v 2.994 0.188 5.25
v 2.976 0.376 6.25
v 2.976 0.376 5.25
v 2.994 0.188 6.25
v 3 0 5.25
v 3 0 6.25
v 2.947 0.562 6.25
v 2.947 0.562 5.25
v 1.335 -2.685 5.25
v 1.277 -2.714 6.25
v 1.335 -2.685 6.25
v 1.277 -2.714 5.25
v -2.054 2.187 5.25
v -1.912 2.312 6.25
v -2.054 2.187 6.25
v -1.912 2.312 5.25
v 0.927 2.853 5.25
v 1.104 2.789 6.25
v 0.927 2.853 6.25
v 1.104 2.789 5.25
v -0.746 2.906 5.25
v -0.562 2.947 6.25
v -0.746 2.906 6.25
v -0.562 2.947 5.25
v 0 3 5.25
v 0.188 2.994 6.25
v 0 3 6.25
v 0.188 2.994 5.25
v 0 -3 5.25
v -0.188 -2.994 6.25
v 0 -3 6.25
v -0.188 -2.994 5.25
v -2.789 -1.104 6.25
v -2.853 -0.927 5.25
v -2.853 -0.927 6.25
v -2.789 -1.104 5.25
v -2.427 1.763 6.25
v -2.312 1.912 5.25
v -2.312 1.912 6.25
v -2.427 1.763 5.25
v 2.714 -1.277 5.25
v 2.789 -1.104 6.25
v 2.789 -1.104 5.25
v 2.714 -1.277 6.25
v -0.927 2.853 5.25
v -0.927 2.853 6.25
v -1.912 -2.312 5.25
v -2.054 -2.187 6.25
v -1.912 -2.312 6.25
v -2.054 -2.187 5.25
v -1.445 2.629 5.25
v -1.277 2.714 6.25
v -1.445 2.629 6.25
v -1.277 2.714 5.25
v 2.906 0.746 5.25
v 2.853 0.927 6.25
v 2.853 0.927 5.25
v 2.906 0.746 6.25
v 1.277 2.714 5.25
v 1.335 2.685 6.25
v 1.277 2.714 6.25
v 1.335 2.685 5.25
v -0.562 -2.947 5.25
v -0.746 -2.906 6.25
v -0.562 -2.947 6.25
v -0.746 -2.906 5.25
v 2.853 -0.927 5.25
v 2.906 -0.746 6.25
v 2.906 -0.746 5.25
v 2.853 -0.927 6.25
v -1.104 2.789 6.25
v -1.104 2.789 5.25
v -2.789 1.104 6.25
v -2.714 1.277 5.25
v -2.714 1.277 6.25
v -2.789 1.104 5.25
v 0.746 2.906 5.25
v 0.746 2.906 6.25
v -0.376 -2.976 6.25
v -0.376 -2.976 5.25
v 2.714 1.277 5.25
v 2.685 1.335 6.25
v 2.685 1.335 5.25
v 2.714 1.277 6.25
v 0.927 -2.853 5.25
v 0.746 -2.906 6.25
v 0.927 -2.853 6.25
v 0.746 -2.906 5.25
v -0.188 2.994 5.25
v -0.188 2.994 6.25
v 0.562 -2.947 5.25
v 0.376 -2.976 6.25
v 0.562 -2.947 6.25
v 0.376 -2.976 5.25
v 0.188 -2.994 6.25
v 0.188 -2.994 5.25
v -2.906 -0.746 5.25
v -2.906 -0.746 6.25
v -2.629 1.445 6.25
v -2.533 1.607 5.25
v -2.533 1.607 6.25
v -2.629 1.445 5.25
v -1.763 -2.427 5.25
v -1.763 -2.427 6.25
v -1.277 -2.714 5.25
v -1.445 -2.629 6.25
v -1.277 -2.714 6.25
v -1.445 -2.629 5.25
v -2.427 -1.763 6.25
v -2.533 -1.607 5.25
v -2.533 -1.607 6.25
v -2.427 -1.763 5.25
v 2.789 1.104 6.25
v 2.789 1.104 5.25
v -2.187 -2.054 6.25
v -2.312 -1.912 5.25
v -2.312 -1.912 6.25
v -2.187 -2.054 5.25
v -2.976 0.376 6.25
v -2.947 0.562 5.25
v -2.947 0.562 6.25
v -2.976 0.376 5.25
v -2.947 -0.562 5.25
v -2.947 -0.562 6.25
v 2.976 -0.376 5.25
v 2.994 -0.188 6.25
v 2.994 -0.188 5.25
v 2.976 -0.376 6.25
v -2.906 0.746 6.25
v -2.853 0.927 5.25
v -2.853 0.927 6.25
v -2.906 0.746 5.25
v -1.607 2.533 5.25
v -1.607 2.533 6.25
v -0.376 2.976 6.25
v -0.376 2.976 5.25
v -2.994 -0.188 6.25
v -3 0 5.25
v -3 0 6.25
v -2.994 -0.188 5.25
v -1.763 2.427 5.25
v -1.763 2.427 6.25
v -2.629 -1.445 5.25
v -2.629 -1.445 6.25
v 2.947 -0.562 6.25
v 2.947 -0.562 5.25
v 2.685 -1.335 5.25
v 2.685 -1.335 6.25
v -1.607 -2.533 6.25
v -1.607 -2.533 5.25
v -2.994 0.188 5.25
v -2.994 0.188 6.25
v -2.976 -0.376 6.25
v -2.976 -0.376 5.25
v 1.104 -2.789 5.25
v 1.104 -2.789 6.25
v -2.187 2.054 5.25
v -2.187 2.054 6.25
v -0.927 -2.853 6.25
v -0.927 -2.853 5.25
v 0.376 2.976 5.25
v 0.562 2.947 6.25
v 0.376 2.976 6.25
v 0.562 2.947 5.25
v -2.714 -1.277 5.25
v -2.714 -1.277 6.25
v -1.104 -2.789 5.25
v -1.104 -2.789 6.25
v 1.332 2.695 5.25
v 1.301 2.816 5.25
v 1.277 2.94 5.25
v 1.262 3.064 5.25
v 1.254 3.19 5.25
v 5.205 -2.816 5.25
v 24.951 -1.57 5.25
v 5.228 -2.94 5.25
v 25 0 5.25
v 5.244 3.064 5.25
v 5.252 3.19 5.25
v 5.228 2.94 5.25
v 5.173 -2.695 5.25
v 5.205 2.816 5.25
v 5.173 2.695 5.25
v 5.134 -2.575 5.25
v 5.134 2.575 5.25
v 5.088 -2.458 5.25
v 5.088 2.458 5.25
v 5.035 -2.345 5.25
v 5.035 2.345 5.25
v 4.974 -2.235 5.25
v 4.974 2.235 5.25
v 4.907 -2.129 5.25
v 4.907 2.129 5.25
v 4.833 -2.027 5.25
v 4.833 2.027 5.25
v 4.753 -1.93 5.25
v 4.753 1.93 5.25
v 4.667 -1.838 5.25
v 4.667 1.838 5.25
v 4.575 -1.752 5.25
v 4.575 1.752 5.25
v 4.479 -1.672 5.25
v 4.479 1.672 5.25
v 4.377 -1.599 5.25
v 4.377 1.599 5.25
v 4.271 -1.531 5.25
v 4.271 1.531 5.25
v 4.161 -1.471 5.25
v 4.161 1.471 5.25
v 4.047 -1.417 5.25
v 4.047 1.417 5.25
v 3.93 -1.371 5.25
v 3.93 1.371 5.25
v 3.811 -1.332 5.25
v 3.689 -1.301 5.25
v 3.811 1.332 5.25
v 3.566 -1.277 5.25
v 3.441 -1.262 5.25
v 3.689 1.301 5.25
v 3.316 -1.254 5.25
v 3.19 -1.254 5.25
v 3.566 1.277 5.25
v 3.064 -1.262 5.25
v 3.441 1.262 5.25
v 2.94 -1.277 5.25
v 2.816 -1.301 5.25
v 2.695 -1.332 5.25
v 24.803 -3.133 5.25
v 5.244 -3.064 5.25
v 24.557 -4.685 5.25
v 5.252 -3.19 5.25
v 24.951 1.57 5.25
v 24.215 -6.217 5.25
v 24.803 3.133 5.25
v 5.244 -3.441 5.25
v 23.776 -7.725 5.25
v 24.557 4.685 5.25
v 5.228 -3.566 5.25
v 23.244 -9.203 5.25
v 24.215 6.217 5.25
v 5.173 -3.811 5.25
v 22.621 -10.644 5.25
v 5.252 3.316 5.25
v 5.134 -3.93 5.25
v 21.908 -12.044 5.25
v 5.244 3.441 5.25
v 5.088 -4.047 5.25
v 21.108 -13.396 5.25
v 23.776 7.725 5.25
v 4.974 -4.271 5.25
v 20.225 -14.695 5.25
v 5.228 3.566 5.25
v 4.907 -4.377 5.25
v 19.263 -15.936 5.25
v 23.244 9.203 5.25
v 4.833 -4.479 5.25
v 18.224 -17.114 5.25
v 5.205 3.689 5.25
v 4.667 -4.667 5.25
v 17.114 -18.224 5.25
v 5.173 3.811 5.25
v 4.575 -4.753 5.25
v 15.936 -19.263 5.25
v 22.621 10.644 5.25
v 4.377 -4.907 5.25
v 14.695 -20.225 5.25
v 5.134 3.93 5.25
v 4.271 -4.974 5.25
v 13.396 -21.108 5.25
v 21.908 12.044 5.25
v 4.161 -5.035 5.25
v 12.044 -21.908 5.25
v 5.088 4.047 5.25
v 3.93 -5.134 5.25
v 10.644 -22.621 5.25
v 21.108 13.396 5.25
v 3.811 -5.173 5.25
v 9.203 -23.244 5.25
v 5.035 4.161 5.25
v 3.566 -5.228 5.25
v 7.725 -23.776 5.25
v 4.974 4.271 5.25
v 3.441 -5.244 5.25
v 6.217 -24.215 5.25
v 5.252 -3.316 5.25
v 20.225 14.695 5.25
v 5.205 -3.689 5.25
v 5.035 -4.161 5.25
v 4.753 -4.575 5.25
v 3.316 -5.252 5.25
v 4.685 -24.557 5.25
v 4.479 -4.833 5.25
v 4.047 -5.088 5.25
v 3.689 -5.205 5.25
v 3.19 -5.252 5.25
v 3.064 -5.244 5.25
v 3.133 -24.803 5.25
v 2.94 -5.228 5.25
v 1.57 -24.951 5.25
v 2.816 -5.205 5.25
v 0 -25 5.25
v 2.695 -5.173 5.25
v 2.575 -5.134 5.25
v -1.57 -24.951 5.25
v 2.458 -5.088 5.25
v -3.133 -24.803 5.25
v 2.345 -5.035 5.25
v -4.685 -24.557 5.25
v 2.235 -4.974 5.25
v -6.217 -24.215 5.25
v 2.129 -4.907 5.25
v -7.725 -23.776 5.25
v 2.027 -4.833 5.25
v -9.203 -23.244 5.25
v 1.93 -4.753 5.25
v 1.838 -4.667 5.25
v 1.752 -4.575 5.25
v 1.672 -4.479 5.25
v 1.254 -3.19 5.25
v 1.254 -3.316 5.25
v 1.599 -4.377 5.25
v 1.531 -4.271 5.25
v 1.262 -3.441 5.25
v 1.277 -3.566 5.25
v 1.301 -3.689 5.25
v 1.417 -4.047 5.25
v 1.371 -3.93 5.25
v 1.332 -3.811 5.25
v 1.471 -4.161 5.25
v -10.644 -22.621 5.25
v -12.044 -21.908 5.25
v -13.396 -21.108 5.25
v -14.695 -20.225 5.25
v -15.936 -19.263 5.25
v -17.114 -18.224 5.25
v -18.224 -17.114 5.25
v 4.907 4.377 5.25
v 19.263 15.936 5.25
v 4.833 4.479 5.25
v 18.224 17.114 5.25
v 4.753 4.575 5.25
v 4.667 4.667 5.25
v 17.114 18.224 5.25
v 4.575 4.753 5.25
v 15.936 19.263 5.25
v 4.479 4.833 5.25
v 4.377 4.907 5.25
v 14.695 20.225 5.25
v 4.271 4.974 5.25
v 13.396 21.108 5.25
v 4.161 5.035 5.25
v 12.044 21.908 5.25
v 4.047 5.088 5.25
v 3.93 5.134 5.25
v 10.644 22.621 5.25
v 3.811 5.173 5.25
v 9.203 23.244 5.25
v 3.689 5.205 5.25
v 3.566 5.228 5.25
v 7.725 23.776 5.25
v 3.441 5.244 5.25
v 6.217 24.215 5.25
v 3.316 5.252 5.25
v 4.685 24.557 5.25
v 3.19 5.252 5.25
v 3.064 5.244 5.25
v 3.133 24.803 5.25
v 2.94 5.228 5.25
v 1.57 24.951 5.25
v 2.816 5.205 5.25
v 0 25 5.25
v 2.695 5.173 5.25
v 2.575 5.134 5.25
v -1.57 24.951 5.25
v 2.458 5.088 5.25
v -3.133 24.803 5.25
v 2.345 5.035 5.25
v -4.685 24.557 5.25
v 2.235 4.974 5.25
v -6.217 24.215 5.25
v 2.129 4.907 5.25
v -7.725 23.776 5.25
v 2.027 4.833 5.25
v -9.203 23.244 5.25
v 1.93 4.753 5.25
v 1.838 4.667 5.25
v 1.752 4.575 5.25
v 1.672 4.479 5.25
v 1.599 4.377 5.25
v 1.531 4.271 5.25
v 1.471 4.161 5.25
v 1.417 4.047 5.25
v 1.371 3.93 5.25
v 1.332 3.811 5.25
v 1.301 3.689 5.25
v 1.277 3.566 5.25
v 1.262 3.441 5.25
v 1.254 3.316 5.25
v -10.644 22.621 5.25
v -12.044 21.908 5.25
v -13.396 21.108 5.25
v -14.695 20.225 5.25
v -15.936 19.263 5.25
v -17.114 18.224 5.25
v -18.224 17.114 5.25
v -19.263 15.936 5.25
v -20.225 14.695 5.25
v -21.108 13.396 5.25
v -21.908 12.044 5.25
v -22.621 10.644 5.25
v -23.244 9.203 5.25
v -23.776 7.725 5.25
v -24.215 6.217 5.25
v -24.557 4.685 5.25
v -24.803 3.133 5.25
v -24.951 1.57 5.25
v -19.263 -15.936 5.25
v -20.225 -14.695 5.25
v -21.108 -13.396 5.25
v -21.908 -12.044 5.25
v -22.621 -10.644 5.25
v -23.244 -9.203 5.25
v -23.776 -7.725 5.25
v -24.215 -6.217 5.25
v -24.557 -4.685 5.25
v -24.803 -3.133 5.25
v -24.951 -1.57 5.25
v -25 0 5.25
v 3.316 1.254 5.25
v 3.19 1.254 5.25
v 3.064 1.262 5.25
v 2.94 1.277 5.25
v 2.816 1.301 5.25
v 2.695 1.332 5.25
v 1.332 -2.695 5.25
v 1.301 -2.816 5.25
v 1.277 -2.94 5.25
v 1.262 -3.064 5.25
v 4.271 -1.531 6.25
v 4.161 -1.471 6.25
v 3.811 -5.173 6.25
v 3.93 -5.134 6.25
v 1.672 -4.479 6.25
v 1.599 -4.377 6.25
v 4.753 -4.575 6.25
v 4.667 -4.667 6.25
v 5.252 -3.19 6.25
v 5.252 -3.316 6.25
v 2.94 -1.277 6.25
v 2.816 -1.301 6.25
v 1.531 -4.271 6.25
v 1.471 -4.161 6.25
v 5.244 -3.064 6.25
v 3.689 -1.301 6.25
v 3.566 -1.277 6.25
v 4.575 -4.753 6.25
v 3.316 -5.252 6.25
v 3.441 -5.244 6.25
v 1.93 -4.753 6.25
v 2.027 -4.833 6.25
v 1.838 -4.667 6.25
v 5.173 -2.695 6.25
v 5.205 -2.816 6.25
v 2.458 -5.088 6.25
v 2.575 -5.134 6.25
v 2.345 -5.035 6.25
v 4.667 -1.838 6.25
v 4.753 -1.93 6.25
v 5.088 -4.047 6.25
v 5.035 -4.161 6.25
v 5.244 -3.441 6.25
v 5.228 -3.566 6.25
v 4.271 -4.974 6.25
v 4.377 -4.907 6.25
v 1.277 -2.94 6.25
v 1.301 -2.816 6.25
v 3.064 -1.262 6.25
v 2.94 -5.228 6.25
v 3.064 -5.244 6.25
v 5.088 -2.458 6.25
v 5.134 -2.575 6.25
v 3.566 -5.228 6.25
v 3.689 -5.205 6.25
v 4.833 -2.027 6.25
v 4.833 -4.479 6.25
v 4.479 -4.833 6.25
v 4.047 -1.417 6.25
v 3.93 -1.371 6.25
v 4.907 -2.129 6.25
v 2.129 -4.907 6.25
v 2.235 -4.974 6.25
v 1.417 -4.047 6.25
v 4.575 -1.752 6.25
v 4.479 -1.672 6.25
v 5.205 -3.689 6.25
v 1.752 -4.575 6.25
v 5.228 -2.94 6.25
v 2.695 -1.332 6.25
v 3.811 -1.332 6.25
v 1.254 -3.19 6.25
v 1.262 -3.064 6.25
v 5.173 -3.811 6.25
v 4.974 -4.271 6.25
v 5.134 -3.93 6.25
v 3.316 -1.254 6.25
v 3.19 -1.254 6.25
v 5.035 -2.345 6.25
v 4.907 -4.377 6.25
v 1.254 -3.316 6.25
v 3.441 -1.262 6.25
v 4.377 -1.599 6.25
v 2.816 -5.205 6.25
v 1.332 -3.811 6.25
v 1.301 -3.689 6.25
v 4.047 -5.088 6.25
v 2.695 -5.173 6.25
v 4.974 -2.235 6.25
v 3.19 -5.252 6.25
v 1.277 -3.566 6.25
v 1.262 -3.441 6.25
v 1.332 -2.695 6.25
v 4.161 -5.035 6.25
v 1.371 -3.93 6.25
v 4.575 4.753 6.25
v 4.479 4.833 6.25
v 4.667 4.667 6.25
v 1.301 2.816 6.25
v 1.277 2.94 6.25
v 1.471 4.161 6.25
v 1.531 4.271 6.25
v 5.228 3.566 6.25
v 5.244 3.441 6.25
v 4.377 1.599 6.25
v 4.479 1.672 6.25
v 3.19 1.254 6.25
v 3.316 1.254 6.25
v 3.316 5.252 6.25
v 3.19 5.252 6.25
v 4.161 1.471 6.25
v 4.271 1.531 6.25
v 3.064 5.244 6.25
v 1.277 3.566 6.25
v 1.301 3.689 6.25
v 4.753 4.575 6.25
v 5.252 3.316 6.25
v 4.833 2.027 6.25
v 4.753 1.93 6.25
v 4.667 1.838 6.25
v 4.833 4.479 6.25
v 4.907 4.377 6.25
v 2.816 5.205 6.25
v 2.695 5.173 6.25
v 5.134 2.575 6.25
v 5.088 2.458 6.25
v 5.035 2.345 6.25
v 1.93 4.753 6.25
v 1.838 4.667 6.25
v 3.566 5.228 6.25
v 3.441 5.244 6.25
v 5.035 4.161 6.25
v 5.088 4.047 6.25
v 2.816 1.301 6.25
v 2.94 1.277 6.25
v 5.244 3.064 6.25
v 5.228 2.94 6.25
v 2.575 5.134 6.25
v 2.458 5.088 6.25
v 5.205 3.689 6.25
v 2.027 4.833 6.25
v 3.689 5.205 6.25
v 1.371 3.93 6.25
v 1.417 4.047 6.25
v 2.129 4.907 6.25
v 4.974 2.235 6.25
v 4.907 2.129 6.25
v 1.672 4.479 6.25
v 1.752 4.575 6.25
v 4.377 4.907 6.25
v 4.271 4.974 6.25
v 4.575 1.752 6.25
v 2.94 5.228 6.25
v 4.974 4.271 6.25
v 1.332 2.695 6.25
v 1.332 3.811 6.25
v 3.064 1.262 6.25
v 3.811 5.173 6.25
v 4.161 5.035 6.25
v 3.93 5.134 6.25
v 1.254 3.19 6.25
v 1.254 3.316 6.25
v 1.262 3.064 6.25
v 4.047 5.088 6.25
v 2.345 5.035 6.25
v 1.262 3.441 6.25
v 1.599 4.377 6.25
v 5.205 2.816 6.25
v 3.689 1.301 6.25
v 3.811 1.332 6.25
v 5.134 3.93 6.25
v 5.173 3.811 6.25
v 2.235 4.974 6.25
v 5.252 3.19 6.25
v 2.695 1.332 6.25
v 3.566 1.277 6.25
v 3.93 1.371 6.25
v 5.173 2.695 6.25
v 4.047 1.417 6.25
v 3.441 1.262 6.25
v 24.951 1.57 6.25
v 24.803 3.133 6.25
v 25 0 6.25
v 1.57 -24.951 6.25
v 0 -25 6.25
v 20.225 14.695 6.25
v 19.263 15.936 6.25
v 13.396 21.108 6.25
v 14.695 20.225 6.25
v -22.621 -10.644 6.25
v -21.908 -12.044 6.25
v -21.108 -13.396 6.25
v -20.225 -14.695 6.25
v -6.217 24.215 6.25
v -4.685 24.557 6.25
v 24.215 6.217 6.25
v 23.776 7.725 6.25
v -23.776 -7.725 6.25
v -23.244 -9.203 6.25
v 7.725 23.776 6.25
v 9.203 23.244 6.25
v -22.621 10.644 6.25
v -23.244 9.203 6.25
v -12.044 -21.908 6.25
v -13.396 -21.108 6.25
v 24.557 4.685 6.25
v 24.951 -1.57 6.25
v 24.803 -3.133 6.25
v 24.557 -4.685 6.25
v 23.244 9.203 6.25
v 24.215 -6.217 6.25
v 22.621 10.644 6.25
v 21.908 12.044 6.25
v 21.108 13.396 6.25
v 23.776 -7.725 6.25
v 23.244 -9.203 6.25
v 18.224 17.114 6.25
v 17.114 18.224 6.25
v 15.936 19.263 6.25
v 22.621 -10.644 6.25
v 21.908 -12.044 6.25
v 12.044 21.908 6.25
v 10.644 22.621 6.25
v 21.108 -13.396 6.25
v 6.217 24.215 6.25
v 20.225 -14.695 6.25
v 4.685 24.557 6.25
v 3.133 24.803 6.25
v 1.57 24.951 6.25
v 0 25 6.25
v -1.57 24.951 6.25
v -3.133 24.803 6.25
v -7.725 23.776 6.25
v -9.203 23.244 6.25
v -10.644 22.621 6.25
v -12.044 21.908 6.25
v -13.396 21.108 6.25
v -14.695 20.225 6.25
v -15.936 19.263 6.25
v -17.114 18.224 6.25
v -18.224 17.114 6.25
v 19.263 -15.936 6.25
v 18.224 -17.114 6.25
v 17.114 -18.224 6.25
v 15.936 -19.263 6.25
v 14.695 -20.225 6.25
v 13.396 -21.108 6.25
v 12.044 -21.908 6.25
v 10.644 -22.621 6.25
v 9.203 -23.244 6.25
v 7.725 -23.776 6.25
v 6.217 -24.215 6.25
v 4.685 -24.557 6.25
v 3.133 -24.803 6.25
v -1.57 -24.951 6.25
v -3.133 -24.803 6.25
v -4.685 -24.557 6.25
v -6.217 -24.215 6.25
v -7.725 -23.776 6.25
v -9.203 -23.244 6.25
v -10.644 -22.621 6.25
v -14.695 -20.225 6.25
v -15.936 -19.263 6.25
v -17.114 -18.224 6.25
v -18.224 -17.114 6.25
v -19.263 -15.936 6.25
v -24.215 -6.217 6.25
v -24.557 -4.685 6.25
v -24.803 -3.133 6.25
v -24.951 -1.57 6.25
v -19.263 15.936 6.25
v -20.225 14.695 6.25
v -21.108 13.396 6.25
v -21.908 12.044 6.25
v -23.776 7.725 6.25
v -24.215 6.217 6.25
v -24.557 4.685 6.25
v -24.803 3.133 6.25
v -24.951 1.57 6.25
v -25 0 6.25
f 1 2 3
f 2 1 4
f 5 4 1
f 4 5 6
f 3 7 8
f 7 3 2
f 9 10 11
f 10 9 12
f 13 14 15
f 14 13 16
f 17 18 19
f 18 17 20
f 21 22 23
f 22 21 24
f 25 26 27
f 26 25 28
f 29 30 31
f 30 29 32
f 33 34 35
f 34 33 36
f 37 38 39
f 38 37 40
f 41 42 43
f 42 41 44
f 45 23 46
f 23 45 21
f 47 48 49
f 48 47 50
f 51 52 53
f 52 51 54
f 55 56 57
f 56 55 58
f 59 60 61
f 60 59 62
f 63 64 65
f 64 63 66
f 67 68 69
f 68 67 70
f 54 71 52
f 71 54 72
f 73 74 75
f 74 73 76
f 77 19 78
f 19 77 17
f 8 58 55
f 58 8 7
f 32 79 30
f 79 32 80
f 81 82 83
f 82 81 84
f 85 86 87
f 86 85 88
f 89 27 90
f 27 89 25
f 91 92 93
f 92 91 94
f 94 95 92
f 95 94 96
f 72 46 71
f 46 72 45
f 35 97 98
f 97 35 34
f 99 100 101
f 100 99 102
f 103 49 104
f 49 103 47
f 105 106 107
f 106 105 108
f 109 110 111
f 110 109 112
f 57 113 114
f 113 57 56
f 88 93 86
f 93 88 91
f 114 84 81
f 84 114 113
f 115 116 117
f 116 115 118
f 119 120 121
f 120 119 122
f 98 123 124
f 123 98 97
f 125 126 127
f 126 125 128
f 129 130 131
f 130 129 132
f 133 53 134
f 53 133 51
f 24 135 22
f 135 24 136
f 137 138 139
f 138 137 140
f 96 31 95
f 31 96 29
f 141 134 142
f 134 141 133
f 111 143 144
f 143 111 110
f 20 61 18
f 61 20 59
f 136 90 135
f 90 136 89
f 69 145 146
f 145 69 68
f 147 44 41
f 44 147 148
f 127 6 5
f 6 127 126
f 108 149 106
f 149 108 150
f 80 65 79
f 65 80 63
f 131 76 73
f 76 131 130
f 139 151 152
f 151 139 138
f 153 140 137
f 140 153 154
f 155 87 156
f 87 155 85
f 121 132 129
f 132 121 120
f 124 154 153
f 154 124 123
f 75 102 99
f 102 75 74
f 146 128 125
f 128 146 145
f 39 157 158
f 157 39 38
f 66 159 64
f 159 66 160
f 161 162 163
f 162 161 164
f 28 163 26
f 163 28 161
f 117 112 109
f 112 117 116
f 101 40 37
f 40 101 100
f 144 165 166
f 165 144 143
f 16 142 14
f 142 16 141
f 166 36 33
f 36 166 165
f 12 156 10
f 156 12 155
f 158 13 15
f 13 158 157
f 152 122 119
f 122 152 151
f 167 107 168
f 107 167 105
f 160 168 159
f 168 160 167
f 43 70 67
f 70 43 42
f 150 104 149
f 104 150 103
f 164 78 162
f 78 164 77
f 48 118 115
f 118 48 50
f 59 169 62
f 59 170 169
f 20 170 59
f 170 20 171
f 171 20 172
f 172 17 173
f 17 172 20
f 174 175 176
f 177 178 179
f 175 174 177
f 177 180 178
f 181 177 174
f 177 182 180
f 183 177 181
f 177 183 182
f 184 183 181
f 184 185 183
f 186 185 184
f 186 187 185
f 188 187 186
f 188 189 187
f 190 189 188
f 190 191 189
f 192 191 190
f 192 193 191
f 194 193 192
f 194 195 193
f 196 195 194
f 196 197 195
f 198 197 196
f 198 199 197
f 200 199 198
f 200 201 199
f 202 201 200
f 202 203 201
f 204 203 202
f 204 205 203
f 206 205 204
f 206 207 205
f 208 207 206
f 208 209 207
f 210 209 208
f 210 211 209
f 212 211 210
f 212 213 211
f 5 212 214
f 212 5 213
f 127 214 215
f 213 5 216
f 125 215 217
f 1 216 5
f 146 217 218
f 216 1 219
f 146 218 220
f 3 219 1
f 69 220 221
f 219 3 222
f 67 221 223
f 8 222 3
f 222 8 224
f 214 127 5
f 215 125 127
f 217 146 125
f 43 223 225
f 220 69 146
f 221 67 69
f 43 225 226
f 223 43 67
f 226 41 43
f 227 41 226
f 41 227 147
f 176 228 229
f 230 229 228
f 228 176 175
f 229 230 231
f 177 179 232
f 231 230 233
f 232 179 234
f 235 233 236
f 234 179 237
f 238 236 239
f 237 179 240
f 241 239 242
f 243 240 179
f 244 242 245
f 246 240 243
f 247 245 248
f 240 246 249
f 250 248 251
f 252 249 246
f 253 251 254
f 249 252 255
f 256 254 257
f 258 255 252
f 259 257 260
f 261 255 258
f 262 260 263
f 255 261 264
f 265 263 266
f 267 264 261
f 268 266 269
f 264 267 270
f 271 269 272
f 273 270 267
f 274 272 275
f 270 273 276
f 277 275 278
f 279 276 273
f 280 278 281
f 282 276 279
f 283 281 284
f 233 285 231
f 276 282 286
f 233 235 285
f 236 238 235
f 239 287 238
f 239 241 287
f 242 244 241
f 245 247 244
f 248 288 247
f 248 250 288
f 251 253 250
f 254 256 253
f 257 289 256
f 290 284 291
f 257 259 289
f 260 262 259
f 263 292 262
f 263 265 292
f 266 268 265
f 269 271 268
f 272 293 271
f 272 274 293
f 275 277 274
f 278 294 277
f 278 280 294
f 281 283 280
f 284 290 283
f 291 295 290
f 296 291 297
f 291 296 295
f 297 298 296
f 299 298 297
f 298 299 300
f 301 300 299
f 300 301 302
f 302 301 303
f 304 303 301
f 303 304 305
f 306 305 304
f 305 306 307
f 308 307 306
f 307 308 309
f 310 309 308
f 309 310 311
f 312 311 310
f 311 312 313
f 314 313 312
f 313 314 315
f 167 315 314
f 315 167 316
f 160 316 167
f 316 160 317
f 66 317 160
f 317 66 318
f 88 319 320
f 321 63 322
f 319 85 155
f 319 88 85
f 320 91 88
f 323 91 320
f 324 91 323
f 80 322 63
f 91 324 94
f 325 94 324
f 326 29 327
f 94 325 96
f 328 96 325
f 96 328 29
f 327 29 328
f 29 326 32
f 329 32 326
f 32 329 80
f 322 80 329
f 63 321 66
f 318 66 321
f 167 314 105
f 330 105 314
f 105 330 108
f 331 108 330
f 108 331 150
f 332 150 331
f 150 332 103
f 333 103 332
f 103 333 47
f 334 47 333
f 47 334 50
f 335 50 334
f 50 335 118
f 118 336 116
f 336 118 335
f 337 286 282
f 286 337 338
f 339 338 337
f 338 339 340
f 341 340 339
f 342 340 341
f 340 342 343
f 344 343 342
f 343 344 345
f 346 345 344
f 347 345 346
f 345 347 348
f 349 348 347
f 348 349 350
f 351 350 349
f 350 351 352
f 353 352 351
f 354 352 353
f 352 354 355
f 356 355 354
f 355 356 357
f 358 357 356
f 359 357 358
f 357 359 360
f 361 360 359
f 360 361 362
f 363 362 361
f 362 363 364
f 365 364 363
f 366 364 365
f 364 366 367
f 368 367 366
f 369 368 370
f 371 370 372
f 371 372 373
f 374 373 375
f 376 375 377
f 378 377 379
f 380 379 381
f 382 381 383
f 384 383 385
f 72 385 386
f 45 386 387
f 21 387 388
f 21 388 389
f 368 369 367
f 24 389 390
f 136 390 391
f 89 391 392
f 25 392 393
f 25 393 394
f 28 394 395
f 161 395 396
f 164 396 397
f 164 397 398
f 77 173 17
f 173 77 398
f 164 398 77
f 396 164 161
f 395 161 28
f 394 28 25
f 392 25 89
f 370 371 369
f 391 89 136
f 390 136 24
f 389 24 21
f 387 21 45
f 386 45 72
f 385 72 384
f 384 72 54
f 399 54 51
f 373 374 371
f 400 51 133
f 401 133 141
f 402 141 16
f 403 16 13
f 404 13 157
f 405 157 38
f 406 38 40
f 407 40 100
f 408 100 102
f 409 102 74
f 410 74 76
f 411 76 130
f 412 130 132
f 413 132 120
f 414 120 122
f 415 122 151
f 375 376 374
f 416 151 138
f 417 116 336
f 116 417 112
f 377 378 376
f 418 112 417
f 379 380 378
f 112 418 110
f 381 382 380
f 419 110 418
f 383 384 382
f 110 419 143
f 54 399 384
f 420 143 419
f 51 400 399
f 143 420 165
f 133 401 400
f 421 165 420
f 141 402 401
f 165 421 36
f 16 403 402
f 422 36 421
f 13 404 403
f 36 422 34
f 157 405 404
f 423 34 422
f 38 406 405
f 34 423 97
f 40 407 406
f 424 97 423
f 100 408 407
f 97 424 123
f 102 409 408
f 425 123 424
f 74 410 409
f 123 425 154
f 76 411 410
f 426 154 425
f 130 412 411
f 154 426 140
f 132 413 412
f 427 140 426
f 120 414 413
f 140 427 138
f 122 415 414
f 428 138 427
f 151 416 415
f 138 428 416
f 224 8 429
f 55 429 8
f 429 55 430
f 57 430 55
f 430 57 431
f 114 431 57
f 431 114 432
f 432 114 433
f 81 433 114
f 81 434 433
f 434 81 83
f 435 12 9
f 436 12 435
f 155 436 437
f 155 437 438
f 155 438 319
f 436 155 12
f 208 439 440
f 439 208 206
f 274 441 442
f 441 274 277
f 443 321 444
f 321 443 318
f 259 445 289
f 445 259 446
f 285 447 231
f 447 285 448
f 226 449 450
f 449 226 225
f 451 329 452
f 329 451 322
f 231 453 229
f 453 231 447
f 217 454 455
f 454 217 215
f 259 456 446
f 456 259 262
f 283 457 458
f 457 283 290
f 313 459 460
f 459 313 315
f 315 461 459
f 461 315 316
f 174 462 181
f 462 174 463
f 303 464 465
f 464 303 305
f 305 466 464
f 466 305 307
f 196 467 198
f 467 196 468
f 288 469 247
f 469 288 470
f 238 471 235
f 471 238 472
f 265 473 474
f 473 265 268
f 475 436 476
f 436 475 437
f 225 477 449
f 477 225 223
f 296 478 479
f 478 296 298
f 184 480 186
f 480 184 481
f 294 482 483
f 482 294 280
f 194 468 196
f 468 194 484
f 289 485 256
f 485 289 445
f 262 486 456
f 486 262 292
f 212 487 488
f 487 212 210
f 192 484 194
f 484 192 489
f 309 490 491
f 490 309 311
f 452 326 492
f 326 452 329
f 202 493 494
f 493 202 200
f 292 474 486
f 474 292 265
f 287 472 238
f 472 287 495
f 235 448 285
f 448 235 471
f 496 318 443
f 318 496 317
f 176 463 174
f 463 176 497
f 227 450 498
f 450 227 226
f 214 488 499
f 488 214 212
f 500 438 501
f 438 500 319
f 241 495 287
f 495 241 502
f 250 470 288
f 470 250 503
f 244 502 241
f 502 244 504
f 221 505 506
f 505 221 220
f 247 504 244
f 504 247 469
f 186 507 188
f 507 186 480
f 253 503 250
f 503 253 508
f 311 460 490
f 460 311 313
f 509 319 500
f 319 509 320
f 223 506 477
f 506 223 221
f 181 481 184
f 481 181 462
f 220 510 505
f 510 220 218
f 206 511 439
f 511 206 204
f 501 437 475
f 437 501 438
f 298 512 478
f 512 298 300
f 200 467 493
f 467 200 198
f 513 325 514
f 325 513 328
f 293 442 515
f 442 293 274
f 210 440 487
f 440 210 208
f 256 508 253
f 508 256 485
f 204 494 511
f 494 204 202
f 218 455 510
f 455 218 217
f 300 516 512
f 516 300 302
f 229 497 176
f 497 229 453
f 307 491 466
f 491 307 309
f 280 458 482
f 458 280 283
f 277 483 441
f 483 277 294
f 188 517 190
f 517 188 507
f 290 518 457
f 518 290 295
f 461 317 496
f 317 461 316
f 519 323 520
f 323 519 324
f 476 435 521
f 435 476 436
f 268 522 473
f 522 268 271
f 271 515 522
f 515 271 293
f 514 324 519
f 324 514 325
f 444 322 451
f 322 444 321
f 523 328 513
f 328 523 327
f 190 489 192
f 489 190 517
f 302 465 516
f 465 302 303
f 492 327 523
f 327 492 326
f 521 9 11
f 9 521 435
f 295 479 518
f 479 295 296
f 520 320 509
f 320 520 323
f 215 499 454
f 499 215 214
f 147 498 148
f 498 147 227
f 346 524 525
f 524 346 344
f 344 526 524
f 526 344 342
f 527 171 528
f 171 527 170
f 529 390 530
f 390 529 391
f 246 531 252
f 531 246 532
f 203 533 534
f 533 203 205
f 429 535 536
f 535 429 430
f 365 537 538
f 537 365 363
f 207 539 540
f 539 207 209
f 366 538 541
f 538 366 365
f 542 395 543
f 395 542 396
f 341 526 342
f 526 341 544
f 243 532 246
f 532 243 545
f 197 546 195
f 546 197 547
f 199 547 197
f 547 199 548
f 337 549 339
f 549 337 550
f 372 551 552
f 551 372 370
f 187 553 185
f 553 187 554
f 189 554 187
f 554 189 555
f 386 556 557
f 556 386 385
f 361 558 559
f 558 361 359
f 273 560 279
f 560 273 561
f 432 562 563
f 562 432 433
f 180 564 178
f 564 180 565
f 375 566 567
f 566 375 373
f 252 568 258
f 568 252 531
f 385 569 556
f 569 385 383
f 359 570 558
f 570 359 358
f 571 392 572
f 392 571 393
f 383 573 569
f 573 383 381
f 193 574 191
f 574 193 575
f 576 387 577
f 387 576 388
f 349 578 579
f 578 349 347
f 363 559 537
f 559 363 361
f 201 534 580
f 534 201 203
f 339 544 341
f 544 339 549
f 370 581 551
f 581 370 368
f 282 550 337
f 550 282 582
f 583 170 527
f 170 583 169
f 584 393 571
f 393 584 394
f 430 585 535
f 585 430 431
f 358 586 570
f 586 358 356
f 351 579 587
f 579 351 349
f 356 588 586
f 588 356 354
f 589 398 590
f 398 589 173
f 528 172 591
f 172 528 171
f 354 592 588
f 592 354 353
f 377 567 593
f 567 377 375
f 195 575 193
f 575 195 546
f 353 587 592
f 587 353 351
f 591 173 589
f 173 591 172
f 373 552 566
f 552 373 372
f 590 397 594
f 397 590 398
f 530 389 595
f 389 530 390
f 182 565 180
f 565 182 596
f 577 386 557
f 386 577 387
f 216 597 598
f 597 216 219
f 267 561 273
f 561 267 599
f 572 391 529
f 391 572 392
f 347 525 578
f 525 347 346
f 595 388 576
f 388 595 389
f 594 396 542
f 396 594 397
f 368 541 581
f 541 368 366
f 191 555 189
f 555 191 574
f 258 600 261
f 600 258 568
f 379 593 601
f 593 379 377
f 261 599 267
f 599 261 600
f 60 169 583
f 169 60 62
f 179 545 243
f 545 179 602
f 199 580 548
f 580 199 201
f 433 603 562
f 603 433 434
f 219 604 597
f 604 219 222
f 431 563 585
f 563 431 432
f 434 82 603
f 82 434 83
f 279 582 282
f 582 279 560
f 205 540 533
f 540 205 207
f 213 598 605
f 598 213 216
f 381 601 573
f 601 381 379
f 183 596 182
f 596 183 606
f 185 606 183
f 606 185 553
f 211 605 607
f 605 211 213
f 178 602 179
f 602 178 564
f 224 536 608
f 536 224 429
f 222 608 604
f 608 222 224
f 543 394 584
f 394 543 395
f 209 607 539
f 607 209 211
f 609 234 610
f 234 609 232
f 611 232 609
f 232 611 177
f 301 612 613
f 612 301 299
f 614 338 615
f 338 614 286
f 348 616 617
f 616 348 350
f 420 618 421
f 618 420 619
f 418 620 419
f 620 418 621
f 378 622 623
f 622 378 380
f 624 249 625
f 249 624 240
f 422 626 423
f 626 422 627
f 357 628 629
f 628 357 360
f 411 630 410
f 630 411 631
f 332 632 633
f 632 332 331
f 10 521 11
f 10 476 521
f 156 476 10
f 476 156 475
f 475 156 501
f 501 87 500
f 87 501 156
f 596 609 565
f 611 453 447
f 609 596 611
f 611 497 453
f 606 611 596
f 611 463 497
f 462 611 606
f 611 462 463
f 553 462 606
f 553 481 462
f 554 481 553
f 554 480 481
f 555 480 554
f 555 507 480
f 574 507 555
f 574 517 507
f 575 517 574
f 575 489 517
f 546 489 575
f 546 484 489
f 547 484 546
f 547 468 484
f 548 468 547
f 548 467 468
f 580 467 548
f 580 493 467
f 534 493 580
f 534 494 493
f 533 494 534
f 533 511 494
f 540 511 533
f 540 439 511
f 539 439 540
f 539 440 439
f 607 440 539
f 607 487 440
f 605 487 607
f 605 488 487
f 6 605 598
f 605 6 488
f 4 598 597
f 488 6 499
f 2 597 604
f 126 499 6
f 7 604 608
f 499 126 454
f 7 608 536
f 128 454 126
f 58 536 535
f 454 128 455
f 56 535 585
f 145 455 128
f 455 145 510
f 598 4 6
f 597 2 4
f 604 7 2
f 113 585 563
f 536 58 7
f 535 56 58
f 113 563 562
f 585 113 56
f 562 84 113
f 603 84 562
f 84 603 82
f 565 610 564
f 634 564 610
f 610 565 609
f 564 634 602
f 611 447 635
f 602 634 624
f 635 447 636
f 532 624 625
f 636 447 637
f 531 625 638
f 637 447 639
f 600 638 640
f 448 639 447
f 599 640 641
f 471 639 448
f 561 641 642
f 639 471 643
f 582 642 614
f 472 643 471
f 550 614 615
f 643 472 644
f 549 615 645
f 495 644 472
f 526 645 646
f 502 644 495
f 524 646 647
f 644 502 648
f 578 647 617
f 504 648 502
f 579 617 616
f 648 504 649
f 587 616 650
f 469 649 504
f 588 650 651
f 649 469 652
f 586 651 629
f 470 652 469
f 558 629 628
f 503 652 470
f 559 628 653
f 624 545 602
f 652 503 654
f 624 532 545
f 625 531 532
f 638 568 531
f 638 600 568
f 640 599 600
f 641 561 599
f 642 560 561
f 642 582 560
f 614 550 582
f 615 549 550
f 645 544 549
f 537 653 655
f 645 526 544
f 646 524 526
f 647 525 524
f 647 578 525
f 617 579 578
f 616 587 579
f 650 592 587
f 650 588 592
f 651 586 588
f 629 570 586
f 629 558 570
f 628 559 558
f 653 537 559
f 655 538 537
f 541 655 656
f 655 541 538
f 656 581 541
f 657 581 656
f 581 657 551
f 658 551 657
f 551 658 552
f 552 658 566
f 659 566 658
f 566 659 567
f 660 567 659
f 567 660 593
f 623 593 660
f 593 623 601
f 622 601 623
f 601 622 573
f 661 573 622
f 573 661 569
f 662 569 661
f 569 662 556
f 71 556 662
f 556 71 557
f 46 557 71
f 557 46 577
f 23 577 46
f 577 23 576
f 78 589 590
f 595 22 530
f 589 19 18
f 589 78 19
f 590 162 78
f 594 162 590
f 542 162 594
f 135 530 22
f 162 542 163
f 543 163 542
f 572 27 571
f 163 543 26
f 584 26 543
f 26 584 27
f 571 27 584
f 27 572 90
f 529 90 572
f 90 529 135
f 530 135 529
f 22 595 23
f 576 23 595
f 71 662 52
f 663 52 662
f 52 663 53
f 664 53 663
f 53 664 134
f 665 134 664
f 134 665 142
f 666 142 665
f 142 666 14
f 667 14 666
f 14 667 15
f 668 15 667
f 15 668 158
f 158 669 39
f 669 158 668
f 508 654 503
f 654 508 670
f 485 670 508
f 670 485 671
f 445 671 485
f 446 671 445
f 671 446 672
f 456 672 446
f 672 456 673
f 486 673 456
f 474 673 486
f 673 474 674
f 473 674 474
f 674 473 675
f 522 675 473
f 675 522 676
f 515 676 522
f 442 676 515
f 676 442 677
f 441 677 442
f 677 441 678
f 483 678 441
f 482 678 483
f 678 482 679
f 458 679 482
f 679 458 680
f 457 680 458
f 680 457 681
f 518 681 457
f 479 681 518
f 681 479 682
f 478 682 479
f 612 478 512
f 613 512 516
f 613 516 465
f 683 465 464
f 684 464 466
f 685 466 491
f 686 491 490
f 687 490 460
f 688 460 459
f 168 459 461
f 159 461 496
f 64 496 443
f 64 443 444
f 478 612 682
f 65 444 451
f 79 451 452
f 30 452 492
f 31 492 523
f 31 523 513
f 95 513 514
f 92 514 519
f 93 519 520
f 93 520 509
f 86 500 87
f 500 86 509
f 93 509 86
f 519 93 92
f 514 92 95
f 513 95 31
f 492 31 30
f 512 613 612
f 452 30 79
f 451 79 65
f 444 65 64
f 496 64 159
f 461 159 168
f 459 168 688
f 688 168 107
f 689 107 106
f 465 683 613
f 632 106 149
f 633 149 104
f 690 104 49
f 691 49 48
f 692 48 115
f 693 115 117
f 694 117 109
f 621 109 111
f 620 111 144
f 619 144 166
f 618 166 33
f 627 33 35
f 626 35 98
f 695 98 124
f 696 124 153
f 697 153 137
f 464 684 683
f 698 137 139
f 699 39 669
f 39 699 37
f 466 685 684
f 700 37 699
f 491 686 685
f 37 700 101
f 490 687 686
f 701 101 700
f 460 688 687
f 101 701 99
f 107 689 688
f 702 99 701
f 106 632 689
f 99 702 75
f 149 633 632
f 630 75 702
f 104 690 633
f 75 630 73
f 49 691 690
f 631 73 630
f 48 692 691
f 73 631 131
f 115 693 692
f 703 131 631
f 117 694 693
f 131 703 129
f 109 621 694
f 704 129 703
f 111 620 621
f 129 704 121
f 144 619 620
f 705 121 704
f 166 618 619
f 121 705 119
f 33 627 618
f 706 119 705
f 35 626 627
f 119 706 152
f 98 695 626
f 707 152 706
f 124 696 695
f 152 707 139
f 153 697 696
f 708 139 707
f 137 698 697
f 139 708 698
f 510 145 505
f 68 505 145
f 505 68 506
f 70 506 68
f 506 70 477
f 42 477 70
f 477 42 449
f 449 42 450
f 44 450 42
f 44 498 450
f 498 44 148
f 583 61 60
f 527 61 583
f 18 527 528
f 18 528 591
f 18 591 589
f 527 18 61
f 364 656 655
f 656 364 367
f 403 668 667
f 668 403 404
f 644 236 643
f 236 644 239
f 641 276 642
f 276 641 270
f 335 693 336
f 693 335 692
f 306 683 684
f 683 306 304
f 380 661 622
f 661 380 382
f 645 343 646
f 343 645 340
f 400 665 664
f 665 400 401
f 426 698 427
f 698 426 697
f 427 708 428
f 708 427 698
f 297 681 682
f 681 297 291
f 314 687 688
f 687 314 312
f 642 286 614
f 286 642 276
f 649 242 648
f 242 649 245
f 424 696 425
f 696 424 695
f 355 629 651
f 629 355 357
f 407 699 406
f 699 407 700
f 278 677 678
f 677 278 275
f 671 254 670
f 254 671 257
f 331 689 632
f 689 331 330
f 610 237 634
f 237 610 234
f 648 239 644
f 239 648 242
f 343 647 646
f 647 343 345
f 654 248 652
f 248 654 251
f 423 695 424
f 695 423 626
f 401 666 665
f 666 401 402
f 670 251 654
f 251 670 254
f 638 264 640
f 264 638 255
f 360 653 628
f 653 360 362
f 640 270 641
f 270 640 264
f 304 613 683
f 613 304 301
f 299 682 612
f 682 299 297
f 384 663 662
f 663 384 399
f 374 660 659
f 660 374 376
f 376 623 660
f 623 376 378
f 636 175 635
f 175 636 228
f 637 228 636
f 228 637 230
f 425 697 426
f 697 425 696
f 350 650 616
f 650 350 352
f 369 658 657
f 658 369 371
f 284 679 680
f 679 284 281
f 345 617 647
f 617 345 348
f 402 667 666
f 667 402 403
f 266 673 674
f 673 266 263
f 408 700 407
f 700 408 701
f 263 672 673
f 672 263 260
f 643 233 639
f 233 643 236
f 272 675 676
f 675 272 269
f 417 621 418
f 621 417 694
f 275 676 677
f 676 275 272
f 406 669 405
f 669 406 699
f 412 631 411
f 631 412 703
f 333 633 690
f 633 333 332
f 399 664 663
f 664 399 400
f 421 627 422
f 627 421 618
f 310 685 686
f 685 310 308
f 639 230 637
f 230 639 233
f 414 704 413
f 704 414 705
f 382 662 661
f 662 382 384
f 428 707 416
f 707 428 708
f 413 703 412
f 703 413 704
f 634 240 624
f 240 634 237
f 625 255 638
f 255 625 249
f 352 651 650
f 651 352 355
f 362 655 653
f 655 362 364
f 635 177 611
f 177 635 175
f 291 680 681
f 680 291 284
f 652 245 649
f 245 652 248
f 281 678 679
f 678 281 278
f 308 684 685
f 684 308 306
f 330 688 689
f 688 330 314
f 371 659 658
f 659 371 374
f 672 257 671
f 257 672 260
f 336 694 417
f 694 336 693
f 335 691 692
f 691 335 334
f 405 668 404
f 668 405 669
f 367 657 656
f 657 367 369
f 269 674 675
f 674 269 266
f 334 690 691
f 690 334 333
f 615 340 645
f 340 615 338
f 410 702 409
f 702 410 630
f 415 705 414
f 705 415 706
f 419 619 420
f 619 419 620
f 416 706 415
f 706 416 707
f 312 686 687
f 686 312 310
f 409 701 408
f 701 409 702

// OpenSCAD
// file: ../lib/threads.scad
/*
 * Dan Kirshner - dan_kirshner@yahoo.com
 *
 * You are welcome to make free use of this software.  Retention of my 
 * authorship credit would be appreciated.
 *
 * Version 1.3.  2013-12-01   Correct loop over turns -- don't have early cut-off
 * Version 1.2.  2012-09-09   Use discrete polyhedra rather than linear_extrude()
 * Version 1.1.  2012-09-07   Corrected to right-hand threads!
 */

// Examples:
//metric_thread(8, 1, 10);
//english_thread(1/4, 20, 1);

// Rohloff hub thread:
//metric_thread(34, 1, 10, internal=true, n_starts=6);

// ----------------------------------------------------------------------------
pi = 3.14159265;


// ----------------------------------------------------------------------------
function segments(diameter) = min(50, ceil(diameter*6));


// ----------------------------------------------------------------------------
// internal - true = clearances for internal thread (e.g., a nut).
//            false = clearances for external thread (e.g., a bolt).
//            (Internal threads should be "cut out" from a solid using
//            difference()).
// n_starts - Number of thread starts (e.g., DNA, a "double helix," has
//            n_starts=2).  See wikipedia Screw_thread.
module metric_thread(diameter=8, pitch=1, length=1, internal=false, n_starts=1)
{
   // Number of turns needed.
   n_turns = floor(length/pitch);
   n_segments = segments(diameter);
   h = pitch * cos(30);

   union() {
      intersection() {
         // Start one below z = 0.  Gives an extra turn at each end.
         for (i=[-1*n_starts : n_turns+1]) {
            translate([0, 0, i*pitch]) {
               metric_thread_turn(diameter, pitch, internal, n_starts);
            }
         }

         // Cut to length.
         translate([0, 0, length/2]) {
            cube([diameter*1.1, diameter*1.1, length], center=true);
         }
      }

      // Solid center, including Dmin truncation.
      if (internal) {
         cylinder(r=diameter/2 - h*5/8, h=length, $fn=n_segments);
      } else {

         // External thread includes additional relief.
         cylinder(r=diameter/2 - h*5.3/8, h=length, $fn=n_segments);
      }
   }
}


// ----------------------------------------------------------------------------
// Input units in inches.
// Note: units of measure in drawing are mm!
module english_thread(diameter=0.25, threads_per_inch=20, length=1,
                      internal=false, n_starts=1)
{
   // Convert to mm.
   mm_diameter = diameter*25.4;
   mm_pitch = (1.0/threads_per_inch)*25.4;
   mm_length = length*25.4;

   echo(str("mm_diameter: ", mm_diameter));
   echo(str("mm_pitch: ", mm_pitch));
   echo(str("mm_length: ", mm_length));
   metric_thread(mm_diameter, mm_pitch, mm_length, internal, n_starts);
}


// ----------------------------------------------------------------------------
module metric_thread_turn(diameter, pitch, internal, n_starts)
{
   n_segments = segments(diameter);
   fraction_circle = 1.0/n_segments;
   for (i=[0 : n_segments-1]) {
      rotate([0, 0, i*360*fraction_circle]) {
         translate([0, 0, i*n_starts*pitch*fraction_circle]) {
            thread_polyhedron(diameter/2, pitch, internal, n_starts);
         }
      }
   }
}


// ----------------------------------------------------------------------------
// z (see diagram) as function of current radius.
// (Only good for first half-pitch.)
function z_fct(current_radius, radius, pitch)
   = 0.5*(current_radius - (radius - 0.875*pitch*cos(30)))
                                                       /cos(30);

// ----------------------------------------------------------------------------
module thread_polyhedron(radius, pitch, internal, n_starts)
{
   n_segments = segments(radius*2);
   fraction_circle = 1.0/n_segments;

   h = pitch * cos(30);
   outer_r = radius + (internal ? h/20 : 0); // Adds internal relief.
   //echo(str("outer_r: ", outer_r));


   inner_r = radius - 0.875*h; // Does NOT do Dmin_truncation - do later with
                               // cylinder.

   // Make these just slightly bigger (keep in proportion) so polyhedra will
   // overlap.
   x_incr_outer = outer_r * fraction_circle * 2 * pi * 1.005;
   x_incr_inner = inner_r * fraction_circle * 2 * pi * 1.005;
   z_incr = n_starts * pitch * fraction_circle * 1.005;

   /*    
    (angles x0 and x3 inner are actually 60 deg)

                          /\  (x2_inner, z2_inner) [2]
                         /  \
   (x3_inner, z3_inner) /    \
                  [3]   \     \
                        |\     \ (x2_outer, z2_outer) [6]
                        | \    /
                        |  \  /|
             z          |   \/ / (x1_outer, z1_outer) [5]
             |          |   | /
             |   x      |   |/
             |  /       |   / (x0_outer, z0_outer) [4]
             | /        |  /     (behind: (x1_inner, z1_inner) [1]
             |/         | /
    y________|          |/
   (r)                  / (x0_inner, z0_inner) [0]

   */

   x1_outer = outer_r * fraction_circle * 2 * pi;

   z0_outer = z_fct(outer_r, radius, pitch);
   //echo(str("z0_outer: ", z0_outer));

   //polygon([[inner_r, 0], [outer_r, z0_outer], 
   //        [outer_r, 0.5*pitch], [inner_r, 0.5*pitch]]);
   z1_outer = z0_outer + z_incr;

   // Rule for triangle ordering: look at polyhedron from outside: points must
   // be in clockwise order.
   polyhedron(
      points = [
                [-x_incr_inner/2, -inner_r, 0],                                    // [0]
                [x_incr_inner/2, -inner_r, z_incr],                    // [1]
                [x_incr_inner/2, -inner_r, pitch + z_incr],            // [2]
                [-x_incr_inner/2, -inner_r, pitch],                                // [3]

                [-x_incr_outer/2, -outer_r, z0_outer],                             // [4]
                [x_incr_outer/2, -outer_r, z0_outer + z_incr],         // [5]
                [x_incr_outer/2, -outer_r, pitch - z0_outer + z_incr], // [6]
                [-x_incr_outer/2, -outer_r, pitch - z0_outer]                      // [7]
               ],

      triangles = [
                [0, 3, 4],  // This-side trapezoid, bottom
                [3, 7, 4],  // This-side trapezoid, top

                [1, 5, 2],  // Back-side trapezoid, bottom
                [2, 5, 6],  // Back-side trapezoid, top

                [0, 1, 2],  // Inner rectangle, bottom
                [0, 2, 3],  // Inner rectangle, top

                [4, 6, 5],  // Outer rectangle, bottom
                [4, 7, 6],  // Outer rectangle, top

                [7, 2, 6],  // Upper rectangle, bottom
                [7, 3, 2],  // Upper rectangle, top

                [0, 5, 1],  // Lower rectangle, bottom
                [0, 4, 5]   // Lower rectangle, top
               ]
   );
}
// main file
include<../lib/threads.scad>

supports = true;
epsilon = 0.1;

ring_outer_r = 26;
ring_inner_r = 23;
ring_thickness = 3;
ring_height = 5;
ring_threaded_height = 3;
ring_extra_thickness = 2;

blocker_height = 1.5;
blocker_width = 14;
blocker_length = 1.2;
blocker_pad = 8;
blocker_pad_rot = asin(blocker_pad / 2 / ring_inner_r);
blocker_rot = blocker_pad_rot + asin(blocker_width / 4 / ring_inner_r) * 2;
blocker_big_width = 5;
blocker_big_length = 1.6;
blocker_big_rot = - blocker_pad_rot + 2 * blocker_rot + asin(blocker_big_width / 4 / ring_inner_r) * 2;
blocker_triangle_rot = blocker_big_rot + asin(blocker_big_width / 4 / ring_inner_r) * 2 + asin(4 / 4 / ring_inner_r) * 2;

holder_height = 1.5;
holder_thickness = 0.8;
holder_length = 2.1;
holder_width = 20;
bokey_height = 1;
bokey_r = ring_inner_r + ring_thickness - holder_thickness - 0.2;

module ring() {
	difference() {
		union() {
			metric_thread(ring_outer_r * 2, 1, ring_threaded_height, internal=false);
			translate([0, 0, ring_threaded_height])
				cylinder(ring_height - ring_threaded_height, ring_outer_r + ring_extra_thickness, ring_outer_r + ring_extra_thickness);
		}
		cylinder(ring_height, ring_inner_r, ring_inner_r);
	}

	if (supports) {
		for (r = [ring_outer_r + ring_extra_thickness : 1 : ring_outer_r+1]) {
			difference() {
				cylinder(ring_threaded_height - epsilon, r, r);
				cylinder(ring_threaded_height - epsilon, r - epsilon, r - epsilon);
			}
		}
	}
}

module ring_holder_lower() {
	translate([0, 0, ring_height]) {
		difference() {
			cylinder(holder_height, ring_outer_r + ring_extra_thickness, ring_outer_r + ring_extra_thickness);
			cylinder(holder_height, ring_inner_r + holder_length, ring_inner_r + holder_length);
		}	
	}
}

module ring_holder_upper() {
	translate([0, 0, ring_height + holder_height]) {
		difference() {
			cylinder(holder_height, ring_outer_r + ring_extra_thickness, ring_outer_r + ring_extra_thickness);
			cylinder(holder_height, ring_inner_r, ring_inner_r);
		}	
	}
}

module holder() {
	intersection() {
		ring_holder_lower();
		translate([ring_inner_r, 0, ring_height + holder_height / 2]) {
			cube([20, holder_width, holder_height], true);
		}
	}

	intersection() {
		ring_holder_upper();
		translate([ring_inner_r, 0, ring_height + holder_height + holder_thickness / 2]) {
			cube([20, holder_width, holder_thickness], true);
		}
	}

	if (supports) {
		intersection() {
			translate([0, 0, ring_height + epsilon]) {
				difference() {
					cylinder(holder_height - 2 * epsilon, ring_inner_r + epsilon, ring_inner_r + epsilon);
					cylinder(holder_height - 2 * epsilon, ring_inner_r, ring_inner_r);
				}	
			}
			translate([ring_inner_r, 0, ring_height + holder_height / 2]) {
				cube([20, holder_width, holder_height], true);
			}
		}

		intersection() {
			translate([0, 0, ring_height + epsilon]) {
				difference() {
					cylinder(holder_height - 2 * epsilon, ring_inner_r + 1 + epsilon, ring_inner_r + 1 + epsilon);
					cylinder(holder_height - 2 * epsilon, ring_inner_r + 1, ring_inner_r + 1);
				}	
			}
			translate([ring_inner_r, 0, ring_height + holder_height / 2]) {
				cube([20, holder_width + 1, holder_height], true);
			}
		}
	}
}

$fn=100;

module boke_support() {
	ring();
	
	holder();
	rotate([0, 0, 180])
		holder();
}

module boke() {
	cylinder(bokey_height, bokey_r, bokey_r);	
}

module sym_mickey() {
	mickey_r = 2;
	cylinder(10, mickey_r * 1.5, mickey_r * 1.5);
	rotate([0, 0, -45])
	translate([mickey_r * 2.3, 0, 0])
		cylinder(10, mickey_r, mickey_r);
	rotate([0, 0, 45])
	translate([mickey_r * 2.3, 0, 0])
		cylinder(10, mickey_r, mickey_r);
}

translate([0,0,ring_height+0.25]) {
	difference() {
		boke();
		sym_mickey();
	}
}

//boke_support();
